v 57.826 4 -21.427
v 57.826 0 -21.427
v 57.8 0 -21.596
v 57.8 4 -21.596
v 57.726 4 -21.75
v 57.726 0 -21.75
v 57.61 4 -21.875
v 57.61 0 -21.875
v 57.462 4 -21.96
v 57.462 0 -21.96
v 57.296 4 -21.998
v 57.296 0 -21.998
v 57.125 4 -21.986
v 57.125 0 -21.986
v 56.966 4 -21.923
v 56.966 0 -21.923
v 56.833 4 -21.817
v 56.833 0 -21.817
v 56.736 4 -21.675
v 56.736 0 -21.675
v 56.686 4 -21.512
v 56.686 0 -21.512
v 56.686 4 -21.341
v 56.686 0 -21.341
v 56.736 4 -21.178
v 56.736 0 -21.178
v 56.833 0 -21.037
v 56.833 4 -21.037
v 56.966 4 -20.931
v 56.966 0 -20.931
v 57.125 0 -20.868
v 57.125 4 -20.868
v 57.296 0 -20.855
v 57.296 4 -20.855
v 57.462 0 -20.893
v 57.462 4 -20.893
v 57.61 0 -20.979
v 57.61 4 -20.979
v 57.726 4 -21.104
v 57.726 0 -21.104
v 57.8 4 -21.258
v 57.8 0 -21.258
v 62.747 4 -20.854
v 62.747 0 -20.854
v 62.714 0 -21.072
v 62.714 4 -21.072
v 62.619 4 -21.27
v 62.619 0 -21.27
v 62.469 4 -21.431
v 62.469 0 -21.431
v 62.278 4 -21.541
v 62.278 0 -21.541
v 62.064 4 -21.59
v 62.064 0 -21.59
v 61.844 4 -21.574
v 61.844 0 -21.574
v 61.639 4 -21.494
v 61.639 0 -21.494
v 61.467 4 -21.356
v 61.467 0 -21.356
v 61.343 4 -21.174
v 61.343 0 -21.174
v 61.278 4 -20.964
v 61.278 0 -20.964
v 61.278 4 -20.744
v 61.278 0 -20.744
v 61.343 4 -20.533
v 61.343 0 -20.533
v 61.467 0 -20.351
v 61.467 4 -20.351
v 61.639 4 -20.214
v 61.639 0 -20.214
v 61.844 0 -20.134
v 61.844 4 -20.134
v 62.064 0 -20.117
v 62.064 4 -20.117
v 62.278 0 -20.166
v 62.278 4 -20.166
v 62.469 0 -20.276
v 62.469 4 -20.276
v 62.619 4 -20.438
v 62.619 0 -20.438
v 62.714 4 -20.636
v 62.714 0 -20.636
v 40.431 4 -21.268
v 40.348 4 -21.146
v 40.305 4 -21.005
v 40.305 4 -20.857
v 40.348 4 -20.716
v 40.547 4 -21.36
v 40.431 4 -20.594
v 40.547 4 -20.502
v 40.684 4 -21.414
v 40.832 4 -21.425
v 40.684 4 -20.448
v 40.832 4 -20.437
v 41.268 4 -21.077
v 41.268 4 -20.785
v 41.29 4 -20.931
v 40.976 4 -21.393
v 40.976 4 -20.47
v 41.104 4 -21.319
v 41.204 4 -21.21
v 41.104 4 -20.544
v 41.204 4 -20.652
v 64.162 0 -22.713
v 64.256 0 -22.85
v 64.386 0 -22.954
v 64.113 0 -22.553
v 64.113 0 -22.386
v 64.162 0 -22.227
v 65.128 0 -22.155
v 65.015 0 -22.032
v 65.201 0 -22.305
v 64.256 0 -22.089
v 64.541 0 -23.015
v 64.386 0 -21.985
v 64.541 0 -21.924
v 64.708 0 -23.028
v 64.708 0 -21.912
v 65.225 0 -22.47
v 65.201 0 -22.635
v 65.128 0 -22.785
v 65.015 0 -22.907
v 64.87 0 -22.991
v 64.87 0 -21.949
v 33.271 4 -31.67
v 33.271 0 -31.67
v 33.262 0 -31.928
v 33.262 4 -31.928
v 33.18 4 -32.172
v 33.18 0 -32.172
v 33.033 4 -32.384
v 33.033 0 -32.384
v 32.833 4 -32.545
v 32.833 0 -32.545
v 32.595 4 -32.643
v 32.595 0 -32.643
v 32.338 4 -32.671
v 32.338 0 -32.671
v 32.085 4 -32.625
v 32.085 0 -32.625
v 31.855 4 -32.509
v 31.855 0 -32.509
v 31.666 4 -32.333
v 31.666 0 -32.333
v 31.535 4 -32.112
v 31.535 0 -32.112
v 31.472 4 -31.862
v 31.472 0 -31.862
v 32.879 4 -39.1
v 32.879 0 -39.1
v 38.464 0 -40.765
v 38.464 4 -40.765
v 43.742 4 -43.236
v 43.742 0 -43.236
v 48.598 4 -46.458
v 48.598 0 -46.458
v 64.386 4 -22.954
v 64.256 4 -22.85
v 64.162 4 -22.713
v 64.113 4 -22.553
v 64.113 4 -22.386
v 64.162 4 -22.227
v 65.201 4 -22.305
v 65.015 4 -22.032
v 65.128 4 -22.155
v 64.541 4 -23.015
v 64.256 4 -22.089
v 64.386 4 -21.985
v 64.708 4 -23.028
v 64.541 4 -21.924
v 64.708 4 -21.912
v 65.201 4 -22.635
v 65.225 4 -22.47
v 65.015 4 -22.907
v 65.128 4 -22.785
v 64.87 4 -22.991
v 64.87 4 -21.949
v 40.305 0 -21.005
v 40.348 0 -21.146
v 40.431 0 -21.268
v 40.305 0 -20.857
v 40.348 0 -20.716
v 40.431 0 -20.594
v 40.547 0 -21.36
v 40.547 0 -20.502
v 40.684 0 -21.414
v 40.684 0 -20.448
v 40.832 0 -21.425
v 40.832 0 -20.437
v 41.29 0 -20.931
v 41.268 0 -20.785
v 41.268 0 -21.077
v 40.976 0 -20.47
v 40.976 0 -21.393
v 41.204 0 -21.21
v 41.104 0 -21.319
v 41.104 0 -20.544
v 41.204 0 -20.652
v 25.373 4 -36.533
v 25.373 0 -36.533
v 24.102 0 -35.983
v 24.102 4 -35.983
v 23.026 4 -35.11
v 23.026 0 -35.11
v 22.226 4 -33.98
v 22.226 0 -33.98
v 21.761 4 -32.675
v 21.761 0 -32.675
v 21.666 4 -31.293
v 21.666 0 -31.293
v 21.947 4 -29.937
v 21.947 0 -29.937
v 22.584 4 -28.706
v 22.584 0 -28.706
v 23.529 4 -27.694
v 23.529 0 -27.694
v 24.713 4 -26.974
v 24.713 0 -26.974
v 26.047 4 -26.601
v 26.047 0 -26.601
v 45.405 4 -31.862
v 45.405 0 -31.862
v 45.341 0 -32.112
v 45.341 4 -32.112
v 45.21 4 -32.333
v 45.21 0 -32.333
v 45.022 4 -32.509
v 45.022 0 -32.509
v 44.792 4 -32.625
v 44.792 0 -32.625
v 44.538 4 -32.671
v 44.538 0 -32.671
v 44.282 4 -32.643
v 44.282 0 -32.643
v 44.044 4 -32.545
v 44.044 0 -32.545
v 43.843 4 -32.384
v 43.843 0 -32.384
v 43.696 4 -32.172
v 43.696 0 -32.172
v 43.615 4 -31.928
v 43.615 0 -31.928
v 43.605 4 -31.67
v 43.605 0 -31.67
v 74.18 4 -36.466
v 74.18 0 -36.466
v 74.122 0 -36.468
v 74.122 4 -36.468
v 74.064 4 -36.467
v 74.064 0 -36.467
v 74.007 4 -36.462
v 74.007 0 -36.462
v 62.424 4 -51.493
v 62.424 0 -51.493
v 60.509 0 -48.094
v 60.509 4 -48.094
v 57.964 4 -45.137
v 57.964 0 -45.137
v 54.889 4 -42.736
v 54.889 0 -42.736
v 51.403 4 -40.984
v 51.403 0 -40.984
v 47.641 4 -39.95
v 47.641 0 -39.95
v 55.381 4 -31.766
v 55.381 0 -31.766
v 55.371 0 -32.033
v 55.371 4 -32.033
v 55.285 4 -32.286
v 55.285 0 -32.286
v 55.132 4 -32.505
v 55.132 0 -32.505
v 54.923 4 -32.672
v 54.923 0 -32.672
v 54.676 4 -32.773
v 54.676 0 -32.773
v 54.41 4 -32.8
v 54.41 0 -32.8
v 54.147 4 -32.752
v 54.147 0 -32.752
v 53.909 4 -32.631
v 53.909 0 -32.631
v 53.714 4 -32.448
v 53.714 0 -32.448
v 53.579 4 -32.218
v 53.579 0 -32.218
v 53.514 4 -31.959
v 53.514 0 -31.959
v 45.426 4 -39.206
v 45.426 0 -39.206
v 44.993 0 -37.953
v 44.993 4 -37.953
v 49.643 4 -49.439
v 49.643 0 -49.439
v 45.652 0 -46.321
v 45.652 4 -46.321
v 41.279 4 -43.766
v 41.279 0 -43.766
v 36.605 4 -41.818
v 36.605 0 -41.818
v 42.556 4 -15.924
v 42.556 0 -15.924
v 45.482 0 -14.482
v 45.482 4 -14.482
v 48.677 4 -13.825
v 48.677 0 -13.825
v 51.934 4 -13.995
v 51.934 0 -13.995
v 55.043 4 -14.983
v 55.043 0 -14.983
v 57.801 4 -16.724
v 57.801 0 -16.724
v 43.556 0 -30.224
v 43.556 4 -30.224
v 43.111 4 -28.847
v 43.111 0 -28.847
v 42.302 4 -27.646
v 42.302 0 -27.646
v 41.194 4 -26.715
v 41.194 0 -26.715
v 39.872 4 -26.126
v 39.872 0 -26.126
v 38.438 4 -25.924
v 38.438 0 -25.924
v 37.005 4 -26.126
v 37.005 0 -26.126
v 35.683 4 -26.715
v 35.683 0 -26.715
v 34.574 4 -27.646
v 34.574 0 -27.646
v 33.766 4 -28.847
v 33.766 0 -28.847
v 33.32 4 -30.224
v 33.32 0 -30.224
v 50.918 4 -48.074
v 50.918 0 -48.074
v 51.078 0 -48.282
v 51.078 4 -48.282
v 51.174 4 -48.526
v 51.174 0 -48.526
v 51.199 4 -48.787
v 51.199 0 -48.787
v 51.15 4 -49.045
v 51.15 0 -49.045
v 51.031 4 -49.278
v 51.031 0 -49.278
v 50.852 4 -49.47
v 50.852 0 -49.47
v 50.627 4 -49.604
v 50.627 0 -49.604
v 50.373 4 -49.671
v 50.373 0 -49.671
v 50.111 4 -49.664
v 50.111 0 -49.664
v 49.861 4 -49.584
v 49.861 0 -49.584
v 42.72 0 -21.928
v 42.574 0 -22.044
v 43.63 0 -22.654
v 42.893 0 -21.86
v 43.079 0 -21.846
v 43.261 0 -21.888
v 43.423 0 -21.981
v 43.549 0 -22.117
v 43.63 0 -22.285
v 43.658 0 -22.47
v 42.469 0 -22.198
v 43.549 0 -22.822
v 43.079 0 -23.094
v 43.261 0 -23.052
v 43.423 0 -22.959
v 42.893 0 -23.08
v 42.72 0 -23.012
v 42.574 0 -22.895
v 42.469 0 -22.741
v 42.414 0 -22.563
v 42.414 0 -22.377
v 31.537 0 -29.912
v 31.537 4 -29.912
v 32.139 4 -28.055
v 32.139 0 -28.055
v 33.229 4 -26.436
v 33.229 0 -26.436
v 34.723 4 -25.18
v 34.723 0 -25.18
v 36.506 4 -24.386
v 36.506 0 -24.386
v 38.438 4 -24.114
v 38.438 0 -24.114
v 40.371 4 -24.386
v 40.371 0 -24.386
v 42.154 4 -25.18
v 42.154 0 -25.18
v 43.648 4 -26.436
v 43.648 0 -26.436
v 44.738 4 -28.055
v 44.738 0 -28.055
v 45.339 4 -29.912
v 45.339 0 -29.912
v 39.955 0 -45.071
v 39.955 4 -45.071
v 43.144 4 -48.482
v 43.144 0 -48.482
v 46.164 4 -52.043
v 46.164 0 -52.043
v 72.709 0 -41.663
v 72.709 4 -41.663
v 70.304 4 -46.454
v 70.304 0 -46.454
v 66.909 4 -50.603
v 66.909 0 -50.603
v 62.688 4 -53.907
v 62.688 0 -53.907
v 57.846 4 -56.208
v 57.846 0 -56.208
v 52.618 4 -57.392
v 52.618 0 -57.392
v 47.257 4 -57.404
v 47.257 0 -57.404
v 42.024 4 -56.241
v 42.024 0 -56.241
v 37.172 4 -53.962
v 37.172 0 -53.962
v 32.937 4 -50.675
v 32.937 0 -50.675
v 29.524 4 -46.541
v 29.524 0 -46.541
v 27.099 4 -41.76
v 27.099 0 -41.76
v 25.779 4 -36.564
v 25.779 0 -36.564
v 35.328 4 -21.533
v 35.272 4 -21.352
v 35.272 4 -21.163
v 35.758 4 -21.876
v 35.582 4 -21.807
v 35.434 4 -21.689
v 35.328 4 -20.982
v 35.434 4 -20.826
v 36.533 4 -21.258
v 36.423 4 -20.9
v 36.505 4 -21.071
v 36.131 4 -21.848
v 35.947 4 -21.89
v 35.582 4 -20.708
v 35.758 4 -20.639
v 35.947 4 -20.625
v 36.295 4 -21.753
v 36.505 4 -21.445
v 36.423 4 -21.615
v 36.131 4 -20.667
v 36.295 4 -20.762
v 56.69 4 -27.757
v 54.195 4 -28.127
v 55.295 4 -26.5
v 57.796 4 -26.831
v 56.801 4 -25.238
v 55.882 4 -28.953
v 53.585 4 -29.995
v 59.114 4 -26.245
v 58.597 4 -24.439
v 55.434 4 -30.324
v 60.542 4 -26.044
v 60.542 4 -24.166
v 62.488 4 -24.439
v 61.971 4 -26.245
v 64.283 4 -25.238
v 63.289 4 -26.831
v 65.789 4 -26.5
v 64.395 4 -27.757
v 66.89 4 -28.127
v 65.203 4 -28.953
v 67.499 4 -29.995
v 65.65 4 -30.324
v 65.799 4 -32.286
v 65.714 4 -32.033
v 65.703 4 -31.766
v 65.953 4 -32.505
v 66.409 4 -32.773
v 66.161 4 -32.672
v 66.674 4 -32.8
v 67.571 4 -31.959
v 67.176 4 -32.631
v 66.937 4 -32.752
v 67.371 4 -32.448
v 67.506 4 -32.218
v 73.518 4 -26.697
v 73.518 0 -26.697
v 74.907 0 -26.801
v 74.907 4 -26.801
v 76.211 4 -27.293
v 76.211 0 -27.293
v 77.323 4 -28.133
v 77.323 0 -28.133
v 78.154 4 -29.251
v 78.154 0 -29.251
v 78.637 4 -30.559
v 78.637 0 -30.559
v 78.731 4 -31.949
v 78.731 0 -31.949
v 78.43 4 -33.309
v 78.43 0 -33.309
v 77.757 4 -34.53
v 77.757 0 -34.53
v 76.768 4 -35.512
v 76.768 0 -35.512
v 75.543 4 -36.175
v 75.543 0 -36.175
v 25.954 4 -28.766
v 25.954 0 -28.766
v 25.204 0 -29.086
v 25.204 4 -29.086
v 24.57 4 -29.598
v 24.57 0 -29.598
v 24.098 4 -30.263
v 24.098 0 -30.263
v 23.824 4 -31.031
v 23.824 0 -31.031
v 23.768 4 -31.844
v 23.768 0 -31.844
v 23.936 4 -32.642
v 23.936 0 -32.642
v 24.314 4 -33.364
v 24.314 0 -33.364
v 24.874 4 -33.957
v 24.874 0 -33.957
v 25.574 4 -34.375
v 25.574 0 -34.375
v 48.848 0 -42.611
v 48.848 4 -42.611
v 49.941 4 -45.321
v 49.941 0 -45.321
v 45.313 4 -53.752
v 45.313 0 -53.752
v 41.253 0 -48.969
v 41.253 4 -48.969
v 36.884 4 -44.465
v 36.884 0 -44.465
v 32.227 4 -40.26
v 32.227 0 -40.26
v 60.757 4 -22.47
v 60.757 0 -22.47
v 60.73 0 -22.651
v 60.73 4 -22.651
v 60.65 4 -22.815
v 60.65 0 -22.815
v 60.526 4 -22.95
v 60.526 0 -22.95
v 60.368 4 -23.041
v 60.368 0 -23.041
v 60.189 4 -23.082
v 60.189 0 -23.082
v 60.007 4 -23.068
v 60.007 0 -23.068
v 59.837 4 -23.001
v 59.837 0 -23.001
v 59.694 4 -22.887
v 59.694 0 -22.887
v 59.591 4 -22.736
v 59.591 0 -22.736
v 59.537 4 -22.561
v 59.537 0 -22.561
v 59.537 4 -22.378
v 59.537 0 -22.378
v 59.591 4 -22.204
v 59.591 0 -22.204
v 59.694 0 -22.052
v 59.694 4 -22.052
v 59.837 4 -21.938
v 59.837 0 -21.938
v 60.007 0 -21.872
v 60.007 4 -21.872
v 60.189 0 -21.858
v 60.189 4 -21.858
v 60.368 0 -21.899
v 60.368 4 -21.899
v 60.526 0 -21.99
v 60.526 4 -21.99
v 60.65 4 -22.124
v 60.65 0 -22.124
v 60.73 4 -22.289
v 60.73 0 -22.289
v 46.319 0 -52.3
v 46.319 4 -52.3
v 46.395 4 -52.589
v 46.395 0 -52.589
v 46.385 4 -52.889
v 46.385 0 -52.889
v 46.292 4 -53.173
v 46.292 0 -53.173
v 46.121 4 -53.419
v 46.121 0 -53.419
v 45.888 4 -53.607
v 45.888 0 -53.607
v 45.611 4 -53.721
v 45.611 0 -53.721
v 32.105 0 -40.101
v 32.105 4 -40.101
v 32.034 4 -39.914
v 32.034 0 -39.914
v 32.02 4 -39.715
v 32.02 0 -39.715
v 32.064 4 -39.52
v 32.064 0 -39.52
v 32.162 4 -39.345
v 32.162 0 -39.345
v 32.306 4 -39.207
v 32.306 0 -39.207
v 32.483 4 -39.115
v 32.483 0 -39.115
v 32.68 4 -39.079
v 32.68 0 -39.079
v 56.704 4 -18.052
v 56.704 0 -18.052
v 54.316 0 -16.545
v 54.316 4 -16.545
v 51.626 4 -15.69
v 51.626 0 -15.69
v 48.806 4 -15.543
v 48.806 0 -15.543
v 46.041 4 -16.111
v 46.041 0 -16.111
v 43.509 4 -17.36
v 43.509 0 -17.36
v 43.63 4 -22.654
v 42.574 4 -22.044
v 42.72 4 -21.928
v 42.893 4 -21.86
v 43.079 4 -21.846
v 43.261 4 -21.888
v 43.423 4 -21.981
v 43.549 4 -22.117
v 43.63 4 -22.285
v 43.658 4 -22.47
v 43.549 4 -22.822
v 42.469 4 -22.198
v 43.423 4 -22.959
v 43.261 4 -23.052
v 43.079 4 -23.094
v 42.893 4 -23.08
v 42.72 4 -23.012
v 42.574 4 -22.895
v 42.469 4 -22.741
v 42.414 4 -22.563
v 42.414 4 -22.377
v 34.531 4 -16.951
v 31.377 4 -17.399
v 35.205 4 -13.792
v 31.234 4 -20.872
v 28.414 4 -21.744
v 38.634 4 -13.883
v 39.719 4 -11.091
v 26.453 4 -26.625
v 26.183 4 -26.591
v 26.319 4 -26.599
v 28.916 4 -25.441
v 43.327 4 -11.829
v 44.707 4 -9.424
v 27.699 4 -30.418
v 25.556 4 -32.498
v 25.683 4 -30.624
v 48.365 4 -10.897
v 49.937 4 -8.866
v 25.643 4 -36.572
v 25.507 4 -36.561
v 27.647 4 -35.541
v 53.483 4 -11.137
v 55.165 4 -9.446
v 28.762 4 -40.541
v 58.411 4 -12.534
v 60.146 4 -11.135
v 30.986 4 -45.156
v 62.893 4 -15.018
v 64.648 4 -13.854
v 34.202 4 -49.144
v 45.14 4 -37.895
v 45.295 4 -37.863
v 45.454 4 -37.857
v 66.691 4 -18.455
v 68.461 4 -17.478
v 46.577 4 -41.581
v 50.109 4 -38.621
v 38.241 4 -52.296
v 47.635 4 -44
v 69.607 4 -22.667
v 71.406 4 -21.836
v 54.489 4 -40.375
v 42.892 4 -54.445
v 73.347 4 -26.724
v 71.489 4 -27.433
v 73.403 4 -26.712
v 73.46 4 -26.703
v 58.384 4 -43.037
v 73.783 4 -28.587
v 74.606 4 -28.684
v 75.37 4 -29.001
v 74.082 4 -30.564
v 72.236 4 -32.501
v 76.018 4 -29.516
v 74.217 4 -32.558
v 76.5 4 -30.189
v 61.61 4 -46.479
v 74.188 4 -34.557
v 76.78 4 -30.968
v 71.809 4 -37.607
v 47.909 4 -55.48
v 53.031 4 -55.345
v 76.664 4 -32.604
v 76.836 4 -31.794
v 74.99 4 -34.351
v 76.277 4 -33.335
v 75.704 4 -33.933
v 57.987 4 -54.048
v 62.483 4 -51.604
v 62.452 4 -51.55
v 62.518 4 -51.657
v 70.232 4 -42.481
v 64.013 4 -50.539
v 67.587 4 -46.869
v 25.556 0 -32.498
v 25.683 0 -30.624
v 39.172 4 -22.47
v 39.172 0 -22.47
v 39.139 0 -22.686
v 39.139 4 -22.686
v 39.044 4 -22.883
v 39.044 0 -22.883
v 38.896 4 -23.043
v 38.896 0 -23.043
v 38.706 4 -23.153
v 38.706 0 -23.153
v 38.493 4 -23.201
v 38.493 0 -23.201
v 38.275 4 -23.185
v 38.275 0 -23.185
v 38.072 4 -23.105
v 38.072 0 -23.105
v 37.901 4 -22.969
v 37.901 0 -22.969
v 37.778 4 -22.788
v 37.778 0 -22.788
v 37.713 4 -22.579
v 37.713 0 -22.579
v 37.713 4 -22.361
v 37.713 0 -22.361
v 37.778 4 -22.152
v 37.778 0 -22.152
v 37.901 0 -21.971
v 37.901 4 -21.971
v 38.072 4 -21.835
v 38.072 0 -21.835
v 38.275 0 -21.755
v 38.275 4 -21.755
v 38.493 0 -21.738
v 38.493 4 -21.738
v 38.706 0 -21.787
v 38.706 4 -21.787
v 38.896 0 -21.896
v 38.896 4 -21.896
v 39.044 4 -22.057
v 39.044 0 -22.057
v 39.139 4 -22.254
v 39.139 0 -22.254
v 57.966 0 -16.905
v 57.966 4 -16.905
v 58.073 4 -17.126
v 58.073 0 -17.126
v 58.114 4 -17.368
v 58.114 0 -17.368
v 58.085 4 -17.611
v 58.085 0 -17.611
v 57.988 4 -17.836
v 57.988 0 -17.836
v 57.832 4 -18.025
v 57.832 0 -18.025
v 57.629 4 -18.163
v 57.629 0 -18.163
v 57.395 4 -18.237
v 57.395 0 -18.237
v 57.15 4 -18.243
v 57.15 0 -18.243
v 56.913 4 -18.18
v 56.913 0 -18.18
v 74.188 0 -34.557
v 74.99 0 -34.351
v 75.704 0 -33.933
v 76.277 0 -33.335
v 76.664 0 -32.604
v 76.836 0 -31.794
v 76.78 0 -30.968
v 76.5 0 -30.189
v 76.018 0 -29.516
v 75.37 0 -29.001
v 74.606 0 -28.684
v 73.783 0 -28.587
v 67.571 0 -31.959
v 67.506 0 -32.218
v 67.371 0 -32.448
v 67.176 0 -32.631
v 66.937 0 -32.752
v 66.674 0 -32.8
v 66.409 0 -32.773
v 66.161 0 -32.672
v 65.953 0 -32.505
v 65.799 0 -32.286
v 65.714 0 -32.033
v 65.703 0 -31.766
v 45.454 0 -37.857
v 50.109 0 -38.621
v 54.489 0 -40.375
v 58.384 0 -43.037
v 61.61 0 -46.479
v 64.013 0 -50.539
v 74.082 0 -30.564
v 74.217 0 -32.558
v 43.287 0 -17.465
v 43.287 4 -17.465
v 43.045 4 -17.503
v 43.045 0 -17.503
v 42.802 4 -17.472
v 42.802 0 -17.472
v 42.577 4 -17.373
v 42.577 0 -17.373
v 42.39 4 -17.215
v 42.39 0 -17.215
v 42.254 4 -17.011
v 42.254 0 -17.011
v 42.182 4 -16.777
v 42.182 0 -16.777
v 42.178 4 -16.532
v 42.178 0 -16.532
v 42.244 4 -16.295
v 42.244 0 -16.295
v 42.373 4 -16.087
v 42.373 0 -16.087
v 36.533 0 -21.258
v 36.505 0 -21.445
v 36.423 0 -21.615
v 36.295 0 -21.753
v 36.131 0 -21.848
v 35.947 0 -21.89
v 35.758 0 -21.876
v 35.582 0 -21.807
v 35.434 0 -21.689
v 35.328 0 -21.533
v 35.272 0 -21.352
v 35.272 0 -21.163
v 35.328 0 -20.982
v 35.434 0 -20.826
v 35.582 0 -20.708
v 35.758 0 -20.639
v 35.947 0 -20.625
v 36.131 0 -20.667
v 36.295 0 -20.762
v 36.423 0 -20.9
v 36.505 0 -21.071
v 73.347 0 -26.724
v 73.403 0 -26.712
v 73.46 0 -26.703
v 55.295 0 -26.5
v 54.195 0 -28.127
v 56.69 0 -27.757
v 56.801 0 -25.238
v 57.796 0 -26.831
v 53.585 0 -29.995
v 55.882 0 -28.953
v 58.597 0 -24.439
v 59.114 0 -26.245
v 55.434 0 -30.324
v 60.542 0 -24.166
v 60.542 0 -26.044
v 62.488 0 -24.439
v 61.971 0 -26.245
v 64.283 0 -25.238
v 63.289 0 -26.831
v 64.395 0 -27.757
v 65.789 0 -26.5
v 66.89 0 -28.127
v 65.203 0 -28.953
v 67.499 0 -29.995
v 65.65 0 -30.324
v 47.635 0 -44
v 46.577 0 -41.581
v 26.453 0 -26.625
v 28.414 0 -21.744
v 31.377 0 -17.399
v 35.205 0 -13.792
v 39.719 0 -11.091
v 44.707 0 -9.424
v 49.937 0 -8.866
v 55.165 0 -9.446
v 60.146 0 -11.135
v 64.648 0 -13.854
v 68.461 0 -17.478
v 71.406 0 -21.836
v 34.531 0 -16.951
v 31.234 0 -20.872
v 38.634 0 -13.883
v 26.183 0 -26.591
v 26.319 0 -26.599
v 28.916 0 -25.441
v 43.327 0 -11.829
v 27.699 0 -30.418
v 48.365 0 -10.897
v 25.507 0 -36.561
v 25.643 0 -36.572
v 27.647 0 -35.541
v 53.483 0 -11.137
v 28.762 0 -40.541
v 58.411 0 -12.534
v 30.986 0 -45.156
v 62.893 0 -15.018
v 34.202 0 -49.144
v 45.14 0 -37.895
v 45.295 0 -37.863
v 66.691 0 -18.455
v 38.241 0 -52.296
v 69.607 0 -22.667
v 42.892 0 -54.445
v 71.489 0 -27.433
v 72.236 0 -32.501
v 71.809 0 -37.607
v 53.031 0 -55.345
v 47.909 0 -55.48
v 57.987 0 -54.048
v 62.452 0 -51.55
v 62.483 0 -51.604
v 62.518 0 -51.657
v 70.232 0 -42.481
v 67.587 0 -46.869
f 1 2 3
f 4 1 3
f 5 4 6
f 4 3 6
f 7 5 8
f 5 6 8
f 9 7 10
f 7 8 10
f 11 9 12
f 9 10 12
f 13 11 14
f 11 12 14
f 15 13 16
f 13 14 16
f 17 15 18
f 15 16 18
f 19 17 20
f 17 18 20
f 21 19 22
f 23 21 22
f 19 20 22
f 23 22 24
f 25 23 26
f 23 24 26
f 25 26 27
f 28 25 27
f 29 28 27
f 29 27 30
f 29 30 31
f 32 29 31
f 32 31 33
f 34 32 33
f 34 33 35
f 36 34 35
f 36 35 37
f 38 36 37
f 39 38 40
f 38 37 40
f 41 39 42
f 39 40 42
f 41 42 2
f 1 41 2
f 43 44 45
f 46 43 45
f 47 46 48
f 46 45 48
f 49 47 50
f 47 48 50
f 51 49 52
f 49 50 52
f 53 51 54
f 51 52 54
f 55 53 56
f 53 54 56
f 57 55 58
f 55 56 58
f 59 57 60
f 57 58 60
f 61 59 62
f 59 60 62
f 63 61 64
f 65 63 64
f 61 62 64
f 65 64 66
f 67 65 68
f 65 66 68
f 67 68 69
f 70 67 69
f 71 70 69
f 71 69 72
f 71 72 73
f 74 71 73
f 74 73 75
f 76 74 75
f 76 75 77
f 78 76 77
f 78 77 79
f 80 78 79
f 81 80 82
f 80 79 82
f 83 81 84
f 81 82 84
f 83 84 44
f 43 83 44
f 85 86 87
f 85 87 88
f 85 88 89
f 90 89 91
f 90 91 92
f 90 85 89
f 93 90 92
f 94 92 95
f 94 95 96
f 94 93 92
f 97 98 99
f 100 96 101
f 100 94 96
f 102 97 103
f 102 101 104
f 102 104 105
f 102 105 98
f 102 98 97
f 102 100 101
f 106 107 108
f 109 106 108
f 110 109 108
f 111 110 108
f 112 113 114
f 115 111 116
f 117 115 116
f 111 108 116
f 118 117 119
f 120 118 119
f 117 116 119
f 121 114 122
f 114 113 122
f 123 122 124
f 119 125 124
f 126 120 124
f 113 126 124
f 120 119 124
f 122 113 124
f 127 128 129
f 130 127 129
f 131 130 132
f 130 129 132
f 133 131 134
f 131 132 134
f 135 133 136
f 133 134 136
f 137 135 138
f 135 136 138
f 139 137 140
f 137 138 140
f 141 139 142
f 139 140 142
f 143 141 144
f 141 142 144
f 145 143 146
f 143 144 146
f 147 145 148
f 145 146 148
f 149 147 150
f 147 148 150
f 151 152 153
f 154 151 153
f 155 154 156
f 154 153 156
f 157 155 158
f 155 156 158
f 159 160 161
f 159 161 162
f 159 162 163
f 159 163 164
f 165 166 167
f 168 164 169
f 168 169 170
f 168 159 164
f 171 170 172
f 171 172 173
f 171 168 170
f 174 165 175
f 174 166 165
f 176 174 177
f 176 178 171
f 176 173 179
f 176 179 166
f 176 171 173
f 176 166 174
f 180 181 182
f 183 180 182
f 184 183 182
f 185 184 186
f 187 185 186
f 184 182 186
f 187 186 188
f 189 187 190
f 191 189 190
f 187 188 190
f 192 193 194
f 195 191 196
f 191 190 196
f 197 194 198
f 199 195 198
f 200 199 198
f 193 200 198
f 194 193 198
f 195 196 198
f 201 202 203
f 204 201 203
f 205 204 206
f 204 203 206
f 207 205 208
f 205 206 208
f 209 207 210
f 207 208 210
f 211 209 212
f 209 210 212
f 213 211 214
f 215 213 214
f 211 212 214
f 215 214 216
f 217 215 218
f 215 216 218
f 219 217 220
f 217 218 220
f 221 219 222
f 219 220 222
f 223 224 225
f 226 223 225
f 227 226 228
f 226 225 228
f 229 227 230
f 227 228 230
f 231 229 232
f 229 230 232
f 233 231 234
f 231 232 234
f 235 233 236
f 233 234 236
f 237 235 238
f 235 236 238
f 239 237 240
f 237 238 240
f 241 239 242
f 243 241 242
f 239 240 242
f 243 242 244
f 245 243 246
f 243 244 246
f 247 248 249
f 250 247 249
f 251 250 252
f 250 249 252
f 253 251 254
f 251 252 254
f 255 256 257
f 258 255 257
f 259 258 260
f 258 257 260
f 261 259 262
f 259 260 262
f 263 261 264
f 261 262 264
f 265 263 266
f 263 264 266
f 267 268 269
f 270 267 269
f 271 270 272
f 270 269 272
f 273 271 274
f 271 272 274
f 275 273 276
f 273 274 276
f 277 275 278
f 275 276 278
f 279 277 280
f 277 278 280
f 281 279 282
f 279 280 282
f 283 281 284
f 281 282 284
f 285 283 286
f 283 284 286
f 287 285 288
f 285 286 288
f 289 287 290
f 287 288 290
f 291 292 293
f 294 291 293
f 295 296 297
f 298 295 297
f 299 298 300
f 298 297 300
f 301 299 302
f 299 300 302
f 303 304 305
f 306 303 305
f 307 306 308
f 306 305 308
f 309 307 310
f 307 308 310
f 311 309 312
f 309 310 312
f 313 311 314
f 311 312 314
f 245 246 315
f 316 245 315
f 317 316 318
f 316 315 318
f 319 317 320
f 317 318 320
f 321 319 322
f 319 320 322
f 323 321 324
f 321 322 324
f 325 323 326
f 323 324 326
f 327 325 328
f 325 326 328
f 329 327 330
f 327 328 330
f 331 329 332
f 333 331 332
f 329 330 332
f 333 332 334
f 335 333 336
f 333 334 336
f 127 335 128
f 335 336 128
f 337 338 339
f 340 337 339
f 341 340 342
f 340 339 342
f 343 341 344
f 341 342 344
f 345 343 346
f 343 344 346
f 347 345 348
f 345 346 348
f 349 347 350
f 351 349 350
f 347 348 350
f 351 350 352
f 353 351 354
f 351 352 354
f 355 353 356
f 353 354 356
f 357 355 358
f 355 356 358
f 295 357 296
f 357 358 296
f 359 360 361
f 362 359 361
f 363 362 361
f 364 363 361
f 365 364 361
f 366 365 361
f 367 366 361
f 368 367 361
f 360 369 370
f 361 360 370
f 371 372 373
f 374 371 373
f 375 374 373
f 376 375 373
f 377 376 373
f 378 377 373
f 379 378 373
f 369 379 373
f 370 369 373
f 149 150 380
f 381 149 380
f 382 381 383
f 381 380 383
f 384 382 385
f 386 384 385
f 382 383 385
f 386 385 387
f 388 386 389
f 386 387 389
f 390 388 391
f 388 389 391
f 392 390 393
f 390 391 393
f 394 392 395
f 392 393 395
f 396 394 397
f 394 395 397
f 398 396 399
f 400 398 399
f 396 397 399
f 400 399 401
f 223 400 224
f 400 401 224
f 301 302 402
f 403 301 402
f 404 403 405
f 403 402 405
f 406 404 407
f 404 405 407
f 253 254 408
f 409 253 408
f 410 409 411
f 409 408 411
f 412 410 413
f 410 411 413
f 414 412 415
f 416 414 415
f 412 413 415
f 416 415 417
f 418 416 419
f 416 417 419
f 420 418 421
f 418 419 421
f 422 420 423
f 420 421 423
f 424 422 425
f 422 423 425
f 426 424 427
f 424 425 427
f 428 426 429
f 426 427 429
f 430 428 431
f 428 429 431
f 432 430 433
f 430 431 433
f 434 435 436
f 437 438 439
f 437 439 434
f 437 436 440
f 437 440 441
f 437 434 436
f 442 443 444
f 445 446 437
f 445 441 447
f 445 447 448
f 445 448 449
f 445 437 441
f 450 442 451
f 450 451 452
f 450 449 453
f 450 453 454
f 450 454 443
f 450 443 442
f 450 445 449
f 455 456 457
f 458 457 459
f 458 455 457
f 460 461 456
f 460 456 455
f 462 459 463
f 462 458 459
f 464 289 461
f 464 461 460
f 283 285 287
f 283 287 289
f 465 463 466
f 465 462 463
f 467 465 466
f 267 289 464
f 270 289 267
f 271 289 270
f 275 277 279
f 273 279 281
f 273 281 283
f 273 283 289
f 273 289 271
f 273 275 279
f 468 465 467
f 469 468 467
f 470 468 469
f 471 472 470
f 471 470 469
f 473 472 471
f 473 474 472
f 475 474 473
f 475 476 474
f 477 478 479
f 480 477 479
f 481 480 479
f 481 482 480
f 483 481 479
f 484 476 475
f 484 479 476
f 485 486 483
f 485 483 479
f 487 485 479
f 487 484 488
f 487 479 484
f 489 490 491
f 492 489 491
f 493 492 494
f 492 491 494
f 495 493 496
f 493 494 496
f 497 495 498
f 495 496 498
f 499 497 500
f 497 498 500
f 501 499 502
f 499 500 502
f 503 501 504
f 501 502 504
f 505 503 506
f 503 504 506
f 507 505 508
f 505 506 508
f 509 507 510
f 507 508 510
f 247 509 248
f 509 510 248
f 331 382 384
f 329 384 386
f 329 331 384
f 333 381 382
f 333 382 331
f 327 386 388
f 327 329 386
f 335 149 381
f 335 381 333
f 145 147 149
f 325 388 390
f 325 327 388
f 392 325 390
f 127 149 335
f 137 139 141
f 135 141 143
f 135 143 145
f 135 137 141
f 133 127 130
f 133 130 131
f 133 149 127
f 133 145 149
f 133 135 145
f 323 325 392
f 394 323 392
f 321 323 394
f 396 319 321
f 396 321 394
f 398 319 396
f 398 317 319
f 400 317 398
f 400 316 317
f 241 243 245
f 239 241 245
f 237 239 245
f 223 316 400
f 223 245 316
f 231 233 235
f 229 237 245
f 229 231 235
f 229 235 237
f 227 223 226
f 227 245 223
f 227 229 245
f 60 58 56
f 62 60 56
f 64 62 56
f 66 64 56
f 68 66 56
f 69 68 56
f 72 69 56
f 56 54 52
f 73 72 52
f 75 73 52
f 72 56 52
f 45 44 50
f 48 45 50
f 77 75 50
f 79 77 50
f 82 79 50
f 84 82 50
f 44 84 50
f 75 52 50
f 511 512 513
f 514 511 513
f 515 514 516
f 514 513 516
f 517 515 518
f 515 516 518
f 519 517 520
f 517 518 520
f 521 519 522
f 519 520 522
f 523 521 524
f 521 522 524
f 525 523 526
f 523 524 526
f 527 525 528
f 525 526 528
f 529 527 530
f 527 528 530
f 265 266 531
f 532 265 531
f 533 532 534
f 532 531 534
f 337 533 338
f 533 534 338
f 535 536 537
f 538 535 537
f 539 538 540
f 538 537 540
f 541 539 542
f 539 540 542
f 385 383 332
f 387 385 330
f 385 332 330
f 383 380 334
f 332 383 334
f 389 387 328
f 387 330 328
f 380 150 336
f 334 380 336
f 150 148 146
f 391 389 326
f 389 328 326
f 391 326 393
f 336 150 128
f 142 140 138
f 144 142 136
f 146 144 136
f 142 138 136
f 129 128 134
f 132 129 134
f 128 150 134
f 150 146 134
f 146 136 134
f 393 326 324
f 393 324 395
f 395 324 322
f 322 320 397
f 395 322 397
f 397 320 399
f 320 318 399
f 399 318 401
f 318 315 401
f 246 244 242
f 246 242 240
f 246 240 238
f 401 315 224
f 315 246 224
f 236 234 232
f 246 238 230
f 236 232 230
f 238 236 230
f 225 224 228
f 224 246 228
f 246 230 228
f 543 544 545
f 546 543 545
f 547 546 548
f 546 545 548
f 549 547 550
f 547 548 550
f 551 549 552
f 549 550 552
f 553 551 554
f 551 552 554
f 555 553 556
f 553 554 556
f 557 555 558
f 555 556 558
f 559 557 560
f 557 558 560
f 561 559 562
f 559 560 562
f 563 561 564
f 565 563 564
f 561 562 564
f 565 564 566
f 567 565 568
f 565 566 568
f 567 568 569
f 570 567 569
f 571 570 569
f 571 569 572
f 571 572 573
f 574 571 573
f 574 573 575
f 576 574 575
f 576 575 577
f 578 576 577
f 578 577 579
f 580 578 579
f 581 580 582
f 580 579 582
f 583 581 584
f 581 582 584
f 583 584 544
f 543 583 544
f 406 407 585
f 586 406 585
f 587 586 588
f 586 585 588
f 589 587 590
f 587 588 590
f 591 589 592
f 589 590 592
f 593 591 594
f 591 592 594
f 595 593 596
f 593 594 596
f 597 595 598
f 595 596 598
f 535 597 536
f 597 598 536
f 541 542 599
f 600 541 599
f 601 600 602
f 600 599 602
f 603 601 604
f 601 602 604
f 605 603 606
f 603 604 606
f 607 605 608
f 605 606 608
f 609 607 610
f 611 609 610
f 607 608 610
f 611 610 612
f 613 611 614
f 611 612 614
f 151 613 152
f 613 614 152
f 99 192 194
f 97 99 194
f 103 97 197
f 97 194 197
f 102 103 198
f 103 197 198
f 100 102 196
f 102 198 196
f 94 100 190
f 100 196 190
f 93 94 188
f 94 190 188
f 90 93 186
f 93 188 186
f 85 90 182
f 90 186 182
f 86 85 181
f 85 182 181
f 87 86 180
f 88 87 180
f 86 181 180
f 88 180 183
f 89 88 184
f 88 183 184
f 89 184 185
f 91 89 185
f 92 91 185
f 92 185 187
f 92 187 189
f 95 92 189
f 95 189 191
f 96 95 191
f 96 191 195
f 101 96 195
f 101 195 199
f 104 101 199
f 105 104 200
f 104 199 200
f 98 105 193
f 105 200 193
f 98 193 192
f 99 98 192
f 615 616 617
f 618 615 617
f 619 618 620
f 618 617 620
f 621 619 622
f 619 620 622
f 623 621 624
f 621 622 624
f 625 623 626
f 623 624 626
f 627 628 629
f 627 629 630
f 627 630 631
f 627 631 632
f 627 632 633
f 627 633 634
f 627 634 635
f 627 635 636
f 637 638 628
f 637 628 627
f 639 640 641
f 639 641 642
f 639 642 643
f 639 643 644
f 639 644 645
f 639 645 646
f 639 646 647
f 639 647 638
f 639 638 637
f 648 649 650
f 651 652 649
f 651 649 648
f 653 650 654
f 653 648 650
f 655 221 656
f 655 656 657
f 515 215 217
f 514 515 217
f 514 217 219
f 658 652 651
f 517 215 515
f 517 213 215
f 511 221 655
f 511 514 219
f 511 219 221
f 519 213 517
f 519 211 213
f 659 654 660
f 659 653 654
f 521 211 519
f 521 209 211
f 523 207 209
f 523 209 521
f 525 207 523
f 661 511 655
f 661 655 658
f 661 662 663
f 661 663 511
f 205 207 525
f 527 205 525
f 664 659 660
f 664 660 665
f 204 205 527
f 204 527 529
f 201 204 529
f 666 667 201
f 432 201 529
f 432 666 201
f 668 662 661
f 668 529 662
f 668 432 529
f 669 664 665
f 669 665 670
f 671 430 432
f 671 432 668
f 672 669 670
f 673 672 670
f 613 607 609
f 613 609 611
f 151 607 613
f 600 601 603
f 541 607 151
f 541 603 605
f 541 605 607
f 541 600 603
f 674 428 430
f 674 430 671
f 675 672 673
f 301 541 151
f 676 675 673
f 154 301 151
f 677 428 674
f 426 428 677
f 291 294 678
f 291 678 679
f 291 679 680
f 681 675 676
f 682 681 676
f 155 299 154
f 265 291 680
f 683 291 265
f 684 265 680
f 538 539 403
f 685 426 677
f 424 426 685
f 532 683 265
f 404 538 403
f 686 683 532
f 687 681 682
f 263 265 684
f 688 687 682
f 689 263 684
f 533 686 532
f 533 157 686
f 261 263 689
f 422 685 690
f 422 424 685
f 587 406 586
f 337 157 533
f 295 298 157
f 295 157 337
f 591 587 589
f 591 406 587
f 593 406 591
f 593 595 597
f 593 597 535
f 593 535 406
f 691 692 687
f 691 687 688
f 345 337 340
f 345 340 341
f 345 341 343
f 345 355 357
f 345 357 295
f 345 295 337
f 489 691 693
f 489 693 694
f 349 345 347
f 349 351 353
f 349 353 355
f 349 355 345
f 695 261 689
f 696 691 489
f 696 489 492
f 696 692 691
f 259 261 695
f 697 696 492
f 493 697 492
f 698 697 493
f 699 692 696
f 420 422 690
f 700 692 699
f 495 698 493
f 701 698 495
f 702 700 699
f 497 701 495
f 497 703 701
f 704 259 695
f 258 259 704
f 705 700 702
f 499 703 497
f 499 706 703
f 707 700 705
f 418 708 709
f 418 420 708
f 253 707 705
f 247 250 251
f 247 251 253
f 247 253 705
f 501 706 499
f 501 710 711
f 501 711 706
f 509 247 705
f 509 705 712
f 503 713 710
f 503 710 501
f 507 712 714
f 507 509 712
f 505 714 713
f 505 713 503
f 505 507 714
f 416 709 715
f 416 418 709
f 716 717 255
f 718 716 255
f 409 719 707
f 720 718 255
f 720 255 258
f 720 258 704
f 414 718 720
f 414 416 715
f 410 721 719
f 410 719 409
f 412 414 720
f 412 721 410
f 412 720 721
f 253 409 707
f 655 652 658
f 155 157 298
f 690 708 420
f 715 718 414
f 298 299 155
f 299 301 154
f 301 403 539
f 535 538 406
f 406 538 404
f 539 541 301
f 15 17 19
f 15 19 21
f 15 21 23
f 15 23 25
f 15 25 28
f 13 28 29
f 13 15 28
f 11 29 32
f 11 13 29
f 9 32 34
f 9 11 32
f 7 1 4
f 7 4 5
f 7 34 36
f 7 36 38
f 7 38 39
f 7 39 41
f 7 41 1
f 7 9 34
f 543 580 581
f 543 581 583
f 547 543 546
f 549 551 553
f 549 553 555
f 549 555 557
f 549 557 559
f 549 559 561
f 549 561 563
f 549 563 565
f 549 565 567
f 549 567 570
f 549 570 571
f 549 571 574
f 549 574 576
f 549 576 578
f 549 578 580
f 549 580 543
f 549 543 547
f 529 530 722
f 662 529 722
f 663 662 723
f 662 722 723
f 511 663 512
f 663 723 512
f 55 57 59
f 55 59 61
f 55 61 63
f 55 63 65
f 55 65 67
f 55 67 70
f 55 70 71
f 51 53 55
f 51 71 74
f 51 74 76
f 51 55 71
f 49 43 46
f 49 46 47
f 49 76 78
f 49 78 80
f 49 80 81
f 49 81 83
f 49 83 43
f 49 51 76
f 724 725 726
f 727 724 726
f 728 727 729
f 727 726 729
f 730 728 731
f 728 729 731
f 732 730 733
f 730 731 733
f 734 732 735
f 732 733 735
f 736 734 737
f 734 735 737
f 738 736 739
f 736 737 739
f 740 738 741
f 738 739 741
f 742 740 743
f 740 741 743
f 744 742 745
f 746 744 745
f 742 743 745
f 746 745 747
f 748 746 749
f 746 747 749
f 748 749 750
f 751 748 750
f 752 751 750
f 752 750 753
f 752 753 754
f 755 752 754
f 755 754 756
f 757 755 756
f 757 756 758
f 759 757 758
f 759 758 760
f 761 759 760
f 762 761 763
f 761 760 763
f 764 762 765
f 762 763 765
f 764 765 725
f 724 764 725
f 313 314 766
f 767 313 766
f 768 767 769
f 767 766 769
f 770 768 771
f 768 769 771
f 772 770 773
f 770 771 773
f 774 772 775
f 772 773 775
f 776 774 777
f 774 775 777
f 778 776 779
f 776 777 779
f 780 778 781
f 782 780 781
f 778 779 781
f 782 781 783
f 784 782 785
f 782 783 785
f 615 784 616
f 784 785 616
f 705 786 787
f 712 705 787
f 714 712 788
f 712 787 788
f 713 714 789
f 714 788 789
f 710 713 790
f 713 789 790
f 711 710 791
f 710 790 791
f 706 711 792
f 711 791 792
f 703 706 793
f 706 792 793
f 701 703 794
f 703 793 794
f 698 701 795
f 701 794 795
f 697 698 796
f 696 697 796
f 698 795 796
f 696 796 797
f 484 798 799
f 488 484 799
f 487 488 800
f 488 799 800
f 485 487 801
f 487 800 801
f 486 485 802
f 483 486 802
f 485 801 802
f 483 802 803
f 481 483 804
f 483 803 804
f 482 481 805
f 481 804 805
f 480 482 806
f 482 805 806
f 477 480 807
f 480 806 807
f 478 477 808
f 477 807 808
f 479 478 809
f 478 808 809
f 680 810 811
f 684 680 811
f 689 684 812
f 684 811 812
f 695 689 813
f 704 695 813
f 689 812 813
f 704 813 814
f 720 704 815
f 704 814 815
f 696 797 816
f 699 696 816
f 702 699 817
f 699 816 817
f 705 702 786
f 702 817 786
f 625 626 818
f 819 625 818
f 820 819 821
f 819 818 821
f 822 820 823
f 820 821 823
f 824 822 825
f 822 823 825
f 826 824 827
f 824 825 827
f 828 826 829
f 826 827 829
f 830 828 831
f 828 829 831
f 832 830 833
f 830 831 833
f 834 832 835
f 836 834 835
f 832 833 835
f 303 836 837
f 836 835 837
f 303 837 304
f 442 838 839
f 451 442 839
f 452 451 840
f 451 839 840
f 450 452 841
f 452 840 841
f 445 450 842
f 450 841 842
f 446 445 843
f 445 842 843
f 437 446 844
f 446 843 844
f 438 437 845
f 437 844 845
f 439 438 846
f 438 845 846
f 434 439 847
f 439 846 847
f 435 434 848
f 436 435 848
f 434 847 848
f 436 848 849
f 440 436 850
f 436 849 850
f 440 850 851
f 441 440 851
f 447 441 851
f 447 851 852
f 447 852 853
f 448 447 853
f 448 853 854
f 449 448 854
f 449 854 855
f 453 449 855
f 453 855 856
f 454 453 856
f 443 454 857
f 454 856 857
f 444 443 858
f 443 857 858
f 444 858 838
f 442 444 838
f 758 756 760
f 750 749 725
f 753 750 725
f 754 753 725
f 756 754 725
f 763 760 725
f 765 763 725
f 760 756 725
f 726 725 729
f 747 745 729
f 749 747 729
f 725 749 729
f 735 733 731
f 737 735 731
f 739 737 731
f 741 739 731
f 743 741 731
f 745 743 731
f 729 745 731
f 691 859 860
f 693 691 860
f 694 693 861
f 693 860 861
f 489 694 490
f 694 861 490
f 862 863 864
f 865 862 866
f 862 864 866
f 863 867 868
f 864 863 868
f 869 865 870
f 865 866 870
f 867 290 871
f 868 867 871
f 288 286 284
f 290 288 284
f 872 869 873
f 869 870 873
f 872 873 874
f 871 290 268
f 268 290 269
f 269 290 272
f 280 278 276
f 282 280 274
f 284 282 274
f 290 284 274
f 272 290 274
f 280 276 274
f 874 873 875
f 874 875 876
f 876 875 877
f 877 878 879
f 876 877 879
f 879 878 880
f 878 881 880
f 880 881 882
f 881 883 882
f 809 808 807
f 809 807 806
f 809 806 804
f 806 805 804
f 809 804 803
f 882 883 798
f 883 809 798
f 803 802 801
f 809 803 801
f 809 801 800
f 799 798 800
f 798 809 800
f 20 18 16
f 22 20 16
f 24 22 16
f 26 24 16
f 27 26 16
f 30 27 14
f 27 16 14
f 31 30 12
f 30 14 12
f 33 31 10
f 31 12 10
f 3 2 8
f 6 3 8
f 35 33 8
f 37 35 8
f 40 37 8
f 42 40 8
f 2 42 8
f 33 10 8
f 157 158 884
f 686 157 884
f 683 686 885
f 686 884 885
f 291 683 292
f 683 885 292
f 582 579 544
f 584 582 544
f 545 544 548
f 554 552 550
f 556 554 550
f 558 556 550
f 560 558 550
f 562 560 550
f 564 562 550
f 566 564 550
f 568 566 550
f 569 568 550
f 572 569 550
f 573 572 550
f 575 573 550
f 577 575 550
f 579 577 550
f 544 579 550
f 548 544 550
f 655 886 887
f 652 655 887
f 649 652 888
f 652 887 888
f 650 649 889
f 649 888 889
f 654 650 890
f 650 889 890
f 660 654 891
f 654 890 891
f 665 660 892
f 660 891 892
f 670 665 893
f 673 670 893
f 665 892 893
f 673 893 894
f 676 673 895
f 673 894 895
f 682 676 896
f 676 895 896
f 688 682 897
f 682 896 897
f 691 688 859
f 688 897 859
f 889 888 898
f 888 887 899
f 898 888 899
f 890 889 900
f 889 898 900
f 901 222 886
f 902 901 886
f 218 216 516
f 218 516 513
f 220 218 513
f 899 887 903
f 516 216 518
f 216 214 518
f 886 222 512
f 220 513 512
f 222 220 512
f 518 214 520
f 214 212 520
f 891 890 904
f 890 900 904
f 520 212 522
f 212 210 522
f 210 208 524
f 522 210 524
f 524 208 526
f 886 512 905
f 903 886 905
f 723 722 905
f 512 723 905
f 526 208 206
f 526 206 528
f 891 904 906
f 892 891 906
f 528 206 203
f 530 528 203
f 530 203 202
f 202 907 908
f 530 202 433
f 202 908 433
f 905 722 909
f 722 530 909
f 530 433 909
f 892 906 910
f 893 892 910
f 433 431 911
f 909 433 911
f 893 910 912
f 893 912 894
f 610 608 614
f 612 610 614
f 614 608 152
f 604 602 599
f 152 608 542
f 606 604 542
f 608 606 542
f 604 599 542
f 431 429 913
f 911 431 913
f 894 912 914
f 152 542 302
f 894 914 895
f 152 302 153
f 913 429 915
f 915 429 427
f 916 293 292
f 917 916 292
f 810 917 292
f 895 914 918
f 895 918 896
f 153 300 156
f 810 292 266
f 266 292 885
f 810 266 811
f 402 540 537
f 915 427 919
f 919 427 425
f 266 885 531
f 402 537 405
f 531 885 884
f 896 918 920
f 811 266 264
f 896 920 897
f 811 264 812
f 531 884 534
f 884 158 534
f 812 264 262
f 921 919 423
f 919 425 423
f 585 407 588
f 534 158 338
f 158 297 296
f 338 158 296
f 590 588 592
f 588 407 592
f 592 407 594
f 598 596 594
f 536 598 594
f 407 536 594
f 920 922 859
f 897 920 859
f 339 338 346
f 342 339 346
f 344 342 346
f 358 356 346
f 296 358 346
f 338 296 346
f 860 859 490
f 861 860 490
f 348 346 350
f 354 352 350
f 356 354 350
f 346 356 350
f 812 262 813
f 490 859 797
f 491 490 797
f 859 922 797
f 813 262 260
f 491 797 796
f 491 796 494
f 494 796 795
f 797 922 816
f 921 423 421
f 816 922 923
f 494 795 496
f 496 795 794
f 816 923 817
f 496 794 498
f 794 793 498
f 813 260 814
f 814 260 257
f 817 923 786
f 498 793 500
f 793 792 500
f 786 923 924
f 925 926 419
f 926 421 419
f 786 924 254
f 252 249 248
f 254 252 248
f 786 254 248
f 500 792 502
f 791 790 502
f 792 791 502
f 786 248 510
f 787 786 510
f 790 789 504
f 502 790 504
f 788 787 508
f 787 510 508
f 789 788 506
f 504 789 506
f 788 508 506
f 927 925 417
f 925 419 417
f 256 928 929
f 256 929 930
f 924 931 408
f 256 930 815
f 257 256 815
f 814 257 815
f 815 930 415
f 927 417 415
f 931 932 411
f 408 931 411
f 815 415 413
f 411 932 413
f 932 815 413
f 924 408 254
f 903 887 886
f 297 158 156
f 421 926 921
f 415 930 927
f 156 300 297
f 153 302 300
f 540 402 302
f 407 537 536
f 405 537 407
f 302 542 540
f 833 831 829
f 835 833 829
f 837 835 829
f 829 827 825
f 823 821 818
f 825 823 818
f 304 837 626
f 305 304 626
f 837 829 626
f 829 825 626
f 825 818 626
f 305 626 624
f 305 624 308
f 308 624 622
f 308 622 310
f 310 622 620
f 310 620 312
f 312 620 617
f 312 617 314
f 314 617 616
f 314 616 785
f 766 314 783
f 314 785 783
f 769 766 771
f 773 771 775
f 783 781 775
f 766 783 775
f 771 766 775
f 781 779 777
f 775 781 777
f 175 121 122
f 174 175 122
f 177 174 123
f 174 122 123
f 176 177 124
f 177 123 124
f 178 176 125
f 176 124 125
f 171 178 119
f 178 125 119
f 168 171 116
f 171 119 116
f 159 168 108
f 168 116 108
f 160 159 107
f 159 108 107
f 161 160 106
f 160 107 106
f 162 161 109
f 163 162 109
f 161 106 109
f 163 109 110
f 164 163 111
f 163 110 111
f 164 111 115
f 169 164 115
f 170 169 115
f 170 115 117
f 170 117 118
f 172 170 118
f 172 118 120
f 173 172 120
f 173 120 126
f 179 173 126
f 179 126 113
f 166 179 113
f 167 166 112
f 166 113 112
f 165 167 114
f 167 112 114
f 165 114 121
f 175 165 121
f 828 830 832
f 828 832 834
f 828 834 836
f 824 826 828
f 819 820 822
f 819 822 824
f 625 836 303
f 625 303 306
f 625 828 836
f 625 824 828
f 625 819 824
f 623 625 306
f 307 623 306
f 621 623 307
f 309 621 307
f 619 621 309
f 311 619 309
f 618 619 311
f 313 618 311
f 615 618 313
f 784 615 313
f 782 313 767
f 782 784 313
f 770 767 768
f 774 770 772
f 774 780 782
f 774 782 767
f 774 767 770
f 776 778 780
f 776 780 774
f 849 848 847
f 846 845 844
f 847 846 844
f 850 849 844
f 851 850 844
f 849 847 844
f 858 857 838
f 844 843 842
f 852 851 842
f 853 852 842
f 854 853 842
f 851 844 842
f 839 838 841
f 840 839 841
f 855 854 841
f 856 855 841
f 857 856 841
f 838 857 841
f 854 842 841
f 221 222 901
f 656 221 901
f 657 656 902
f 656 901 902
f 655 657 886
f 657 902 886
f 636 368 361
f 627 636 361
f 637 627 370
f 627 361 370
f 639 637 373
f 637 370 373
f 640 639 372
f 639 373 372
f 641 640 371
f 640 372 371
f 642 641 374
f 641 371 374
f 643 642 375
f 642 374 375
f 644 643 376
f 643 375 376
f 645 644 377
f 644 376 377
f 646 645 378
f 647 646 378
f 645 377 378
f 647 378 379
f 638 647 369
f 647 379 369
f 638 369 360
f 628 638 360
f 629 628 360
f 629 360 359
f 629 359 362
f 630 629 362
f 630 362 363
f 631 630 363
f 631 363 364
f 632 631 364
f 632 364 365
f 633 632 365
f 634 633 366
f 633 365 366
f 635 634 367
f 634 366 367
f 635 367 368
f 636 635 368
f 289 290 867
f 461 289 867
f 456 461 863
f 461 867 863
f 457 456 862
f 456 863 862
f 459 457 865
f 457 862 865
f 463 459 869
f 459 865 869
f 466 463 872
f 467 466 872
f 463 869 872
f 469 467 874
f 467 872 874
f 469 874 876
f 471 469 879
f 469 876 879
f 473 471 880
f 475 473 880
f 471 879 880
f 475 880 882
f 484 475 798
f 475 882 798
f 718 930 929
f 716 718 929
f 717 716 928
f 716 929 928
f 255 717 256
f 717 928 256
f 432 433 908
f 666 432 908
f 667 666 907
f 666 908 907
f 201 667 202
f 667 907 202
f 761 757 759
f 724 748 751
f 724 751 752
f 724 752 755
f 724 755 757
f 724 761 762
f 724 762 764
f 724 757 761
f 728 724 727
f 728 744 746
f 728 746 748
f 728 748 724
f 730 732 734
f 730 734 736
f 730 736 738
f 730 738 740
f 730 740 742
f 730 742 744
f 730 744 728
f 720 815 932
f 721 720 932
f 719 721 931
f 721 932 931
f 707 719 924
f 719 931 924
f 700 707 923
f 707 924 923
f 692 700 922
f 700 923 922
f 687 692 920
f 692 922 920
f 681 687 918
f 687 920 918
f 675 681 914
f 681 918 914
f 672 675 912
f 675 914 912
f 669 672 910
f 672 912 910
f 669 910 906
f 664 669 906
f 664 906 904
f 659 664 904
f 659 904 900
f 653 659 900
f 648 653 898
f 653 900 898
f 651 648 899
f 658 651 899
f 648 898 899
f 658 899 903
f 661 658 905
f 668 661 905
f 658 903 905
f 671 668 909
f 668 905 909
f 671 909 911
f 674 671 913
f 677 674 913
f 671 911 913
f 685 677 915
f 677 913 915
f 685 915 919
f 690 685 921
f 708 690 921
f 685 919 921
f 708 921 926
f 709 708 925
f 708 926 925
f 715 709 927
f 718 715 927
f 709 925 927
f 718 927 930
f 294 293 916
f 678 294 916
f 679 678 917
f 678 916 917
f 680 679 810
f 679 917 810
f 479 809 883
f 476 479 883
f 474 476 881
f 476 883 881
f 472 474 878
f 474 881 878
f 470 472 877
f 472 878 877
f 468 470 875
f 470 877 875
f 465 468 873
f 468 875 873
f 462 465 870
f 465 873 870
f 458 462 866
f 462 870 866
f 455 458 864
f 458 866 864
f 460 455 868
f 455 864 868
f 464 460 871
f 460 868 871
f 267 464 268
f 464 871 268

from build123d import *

# Parameters (mm, degrees)
SALIENTE_EXTRUIR1_DEPTH    = 4
SALIENTE_EXTRUIR1_2_DEPTH  = 4
SALIENTE_EXTRUIR1_3_DEPTH  = 4
CROQUIS1_R                 = 0.634147611
SALIENTE_EXTRUIR1_4_DEPTH  = 4
CROQUIS1_R_2               = 0.733396993
SALIENTE_EXTRUIR1_5_DEPTH  = 4
CROQUIS1_R_3               = 0.495614174
SALIENTE_EXTRUIR1_6_DEPTH  = 4
CROQUIS1_R_4               = 0.62551935
SALIENTE_EXTRUIR1_7_DEPTH  = 4
CROQUIS1_R_5               = 0.573021967
SALIENTE_EXTRUIR1_8_DEPTH  = 4
CROQUIS1_R_6               = 0.613581805
SALIENTE_EXTRUIR1_9_DEPTH  = 4
CROQUIS1_R_7               = 0.738734644
SALIENTE_EXTRUIR1_10_DEPTH = 4
CROQUIS1_R_8               = 0.559481515
SALIENTE_EXTRUIR1_11_DEPTH = 4
SALIENTE_EXTRUIR1_12_DEPTH = 4


with BuildPart() as part:
    # Croquis1 → Saliente-Extruir1 (new body)
    with BuildSketch(Plane(origin=(0, 0, 0), x_dir=(1, 0, 0), z_dir=(0, 1, 0))):
        with BuildLine():
            ThreePointArc((74.1799457, 36.466185156), (74.093352849, 36.468100095), (74.006945291, 36.462123248))
            ThreePointArc((74.006945291, 36.462123248), (49.937454193, 57.546084492), (25.778677934, 36.564488912))
            ThreePointArc((25.778677934, 36.564488912), (25.574476045, 36.568511171), (25.373334573, 36.533061235))
            ThreePointArc((25.373334573, 36.533061235), (21.665572097, 31.292911344), (26.04671396, 26.601187839))
            ThreePointArc((26.04671396, 26.601187839), (26.250799676, 26.59321224), (26.452589876, 26.624760696))
            ThreePointArc((26.452589876, 26.624760696), (49.937454193, 8.86639079), (73.346722109, 26.724294626))
            ThreePointArc((73.346722109, 26.724294626), (73.431532152, 26.706709253), (73.517591019, 26.696918434))
            ThreePointArc((73.517591019, 26.696918434), (78.733401721, 31.250374455), (74.1799457, 36.466185156))
        make_face()
        with BuildLine():
            ThreePointArc((25.95430405, 28.766115478), (23.768039797, 31.435458309), (25.573990554, 34.375472662))
            ThreePointArc((25.573990554, 34.375472662), (25.601641514, 31.559776204), (25.95430405, 28.766115478))
        make_face(mode=Mode.SUBTRACT)
        with BuildLine():
            ThreePointArc((74.18816102, 34.557417605), (76.83706478, 31.378945788), (73.783375068, 28.587108873))
            ThreePointArc((73.783375068, 28.587108873), (74.169943046, 31.559776204), (74.18816102, 34.557417605))
        make_face(mode=Mode.SUBTRACT)
        with BuildLine():
            ThreePointArc((48.597651163, 46.457889546), (47.118213116, 42.785490463), (45.425593016, 39.206344036))
            Line((45.425593016, 39.206344036), (44.993103459, 37.95333726))
            ThreePointArc((44.993103459, 37.95333726), (45.217239696, 37.87538969), (45.453858509, 37.857378194))
            ThreePointArc((45.453858509, 37.857378194), (56.509068448, 41.599742996), (64.013179702, 50.539053674))
            ThreePointArc((64.013179702, 50.539053674), (36.494307306, 15.298761068), (62.518026203, 51.657152337))
            ThreePointArc((62.518026203, 51.657152337), (62.466890552, 51.577254722), (62.42425572, 51.492515388))
            ThreePointArc((62.42425572, 51.492515388), (56.485714844, 43.860153446), (47.640867648, 39.950179711))
            ThreePointArc((47.640867648, 39.950179711), (49.408626903, 43.96017081), (50.918352783, 48.074259915))
            ThreePointArc((50.918352783, 48.074259915), (50.948218866, 49.380538478), (49.642890368, 49.43861756))
            ThreePointArc((49.642890368, 49.43861756), (43.508384082, 44.970402926), (36.604580424, 41.818482171))
            ThreePointArc((36.604580424, 41.818482171), (41.569805001, 46.757329696), (46.163596362, 52.043420018))
            ThreePointArc((46.163596362, 52.043420018), (46.291811269, 53.173113113), (45.313276313, 53.7520042))
            ThreePointArc((45.313276313, 53.7520042), (39.105711287, 46.680393607), (32.227179127, 40.259542009))
            ThreePointArc((32.227179127, 40.259542009), (32.106258057, 39.428878951), (32.878756679, 39.10044494))
            ThreePointArc((32.878756679, 39.10044494), (41.148364583, 41.902874928), (48.597651163, 46.457889546))
        make_face(mode=Mode.SUBTRACT)
    extrude(amount=SALIENTE_EXTRUIR1_DEPTH)


with BuildPart() as body_2:
    # Croquis1 → Saliente-Extruir1 2 (new body)
    with BuildSketch(Plane(origin=(0, 0, 0), x_dir=(1, 0, 0), z_dir=(0, 1, 0))):
        with BuildLine():
            ThreePointArc((33.271446194, 31.670423286), (32.467457599, 32.666113812), (31.471767073, 31.862125217))
            ThreePointArc((31.471767073, 31.862125217), (38.438273667, 24.114134575), (45.404780261, 31.862125217))
            ThreePointArc((45.404780261, 31.862125217), (44.409089735, 32.666113812), (43.60510114, 31.670423286))
            ThreePointArc((43.60510114, 31.670423286), (38.438273667, 25.923994948), (33.271446194, 31.670423286))
        make_face()
    extrude(amount=SALIENTE_EXTRUIR1_2_DEPTH)


with BuildPart() as body_3:
    # Croquis1 → Saliente-Extruir1 3 (new body)
    with BuildSketch(Plane(origin=(0, 0, 0), x_dir=(1, 0, 0), z_dir=(0, 1, 0))):
        with BuildLine():
            ThreePointArc((55.381488681, 31.765631263), (54.544027848, 32.796080004), (53.513579106, 31.958619171))
            ThreePointArc((53.513579106, 31.958619171), (60.542287348, 24.166307285), (67.570995591, 31.958619171))
            ThreePointArc((67.570995591, 31.958619171), (66.540546849, 32.796080004), (65.703086016, 31.765631263))
            ThreePointArc((65.703086016, 31.765631263), (60.542287348, 26.044159919), (55.381488681, 31.765631263))
        make_face()
    extrude(amount=SALIENTE_EXTRUIR1_3_DEPTH)


with BuildPart() as body_4:
    # Croquis1 → Saliente-Extruir1 4 (new body)
    with BuildSketch(Plane(origin=(0, 0, 0), x_dir=(1, 0, 0), z_dir=(0, 1, 0))):
        with Locations((35.899204995, 21.257599233)):
            Circle(CROQUIS1_R)
    extrude(amount=SALIENTE_EXTRUIR1_4_DEPTH)


with BuildPart() as body_5:
    # Croquis1 → Saliente-Extruir1 5 (new body)
    with BuildSketch(Plane(origin=(0, 0, 0), x_dir=(1, 0, 0), z_dir=(0, 1, 0))):
        with Locations((38.438273667, 22.469809183)):
            Circle(CROQUIS1_R_2)
    extrude(amount=SALIENTE_EXTRUIR1_5_DEPTH)


with BuildPart() as body_6:
    # Croquis1 → Saliente-Extruir1 6 (new body)
    with BuildSketch(Plane(origin=(0, 0, 0), x_dir=(1, 0, 0), z_dir=(0, 1, 0))):
        with Locations((40.794668254, 20.931235016)):
            Circle(CROQUIS1_R_3)
    extrude(amount=SALIENTE_EXTRUIR1_6_DEPTH)


with BuildPart() as body_7:
    # Croquis1 → Saliente-Extruir1 7 (new body)
    with BuildSketch(Plane(origin=(0, 0, 0), x_dir=(1, 0, 0), z_dir=(0, 1, 0))):
        with Locations((43.032594315, 22.469809183)):
            Circle(CROQUIS1_R_4)
    extrude(amount=SALIENTE_EXTRUIR1_7_DEPTH)


with BuildPart() as body_8:
    # Croquis1 → Saliente-Extruir1 8 (new body)
    with BuildSketch(Plane(origin=(0, 0, 0), x_dir=(1, 0, 0), z_dir=(0, 1, 0))):
        with Locations((57.252749495, 21.42684919)):
            Circle(CROQUIS1_R_5)
    extrude(amount=SALIENTE_EXTRUIR1_8_DEPTH)


with BuildPart() as body_9:
    # Croquis1 → Saliente-Extruir1 9 (new body)
    with BuildSketch(Plane(origin=(0, 0, 0), x_dir=(1, 0, 0), z_dir=(0, 1, 0))):
        with Locations((60.143403991, 22.469809183)):
            Circle(CROQUIS1_R_6)
    extrude(amount=SALIENTE_EXTRUIR1_9_DEPTH)


with BuildPart() as body_10:
    # Croquis1 → Saliente-Extruir1 10 (new body)
    with BuildSketch(Plane(origin=(0, 0, 0), x_dir=(1, 0, 0), z_dir=(0, 1, 0))):
        with Locations((62.008342375, 20.853827223)):
            Circle(CROQUIS1_R_7)
    extrude(amount=SALIENTE_EXTRUIR1_10_DEPTH)


with BuildPart() as body_11:
    # Croquis1 → Saliente-Extruir1 11 (new body)
    with BuildSketch(Plane(origin=(0, 0, 0), x_dir=(1, 0, 0), z_dir=(0, 1, 0))):
        with Locations((64.665879573, 22.469809183)):
            Circle(CROQUIS1_R_8)
    extrude(amount=SALIENTE_EXTRUIR1_11_DEPTH)


with BuildPart() as body_12:
    # Croquis1 → Saliente-Extruir1 12 (new body)
    with BuildSketch(Plane(origin=(0, 0, 0), x_dir=(1, 0, 0), z_dir=(0, 1, 0))):
        with BuildLine():
            ThreePointArc((43.508757823, 17.359730941), (42.314740106, 17.11804024), (42.556430807, 15.924022523))
            ThreePointArc((42.556430807, 15.924022523), (50.311008053, 13.805956585), (57.801408595, 16.723759063))
            ThreePointArc((57.801408595, 16.723759063), (57.916842518, 17.936511186), (56.704090395, 18.051945109))
            ThreePointArc((56.704090395, 18.051945109), (50.220753546, 15.526433126), (43.508757823, 17.359730941))
        make_face()
    extrude(amount=SALIENTE_EXTRUIR1_12_DEPTH)


solid = Compound([part.part, body_2.part, body_3.part, body_4.part, body_5.part, body_6.part, body_7.part, body_8.part, body_9.part, body_10.part, body_11.part, body_12.part])
